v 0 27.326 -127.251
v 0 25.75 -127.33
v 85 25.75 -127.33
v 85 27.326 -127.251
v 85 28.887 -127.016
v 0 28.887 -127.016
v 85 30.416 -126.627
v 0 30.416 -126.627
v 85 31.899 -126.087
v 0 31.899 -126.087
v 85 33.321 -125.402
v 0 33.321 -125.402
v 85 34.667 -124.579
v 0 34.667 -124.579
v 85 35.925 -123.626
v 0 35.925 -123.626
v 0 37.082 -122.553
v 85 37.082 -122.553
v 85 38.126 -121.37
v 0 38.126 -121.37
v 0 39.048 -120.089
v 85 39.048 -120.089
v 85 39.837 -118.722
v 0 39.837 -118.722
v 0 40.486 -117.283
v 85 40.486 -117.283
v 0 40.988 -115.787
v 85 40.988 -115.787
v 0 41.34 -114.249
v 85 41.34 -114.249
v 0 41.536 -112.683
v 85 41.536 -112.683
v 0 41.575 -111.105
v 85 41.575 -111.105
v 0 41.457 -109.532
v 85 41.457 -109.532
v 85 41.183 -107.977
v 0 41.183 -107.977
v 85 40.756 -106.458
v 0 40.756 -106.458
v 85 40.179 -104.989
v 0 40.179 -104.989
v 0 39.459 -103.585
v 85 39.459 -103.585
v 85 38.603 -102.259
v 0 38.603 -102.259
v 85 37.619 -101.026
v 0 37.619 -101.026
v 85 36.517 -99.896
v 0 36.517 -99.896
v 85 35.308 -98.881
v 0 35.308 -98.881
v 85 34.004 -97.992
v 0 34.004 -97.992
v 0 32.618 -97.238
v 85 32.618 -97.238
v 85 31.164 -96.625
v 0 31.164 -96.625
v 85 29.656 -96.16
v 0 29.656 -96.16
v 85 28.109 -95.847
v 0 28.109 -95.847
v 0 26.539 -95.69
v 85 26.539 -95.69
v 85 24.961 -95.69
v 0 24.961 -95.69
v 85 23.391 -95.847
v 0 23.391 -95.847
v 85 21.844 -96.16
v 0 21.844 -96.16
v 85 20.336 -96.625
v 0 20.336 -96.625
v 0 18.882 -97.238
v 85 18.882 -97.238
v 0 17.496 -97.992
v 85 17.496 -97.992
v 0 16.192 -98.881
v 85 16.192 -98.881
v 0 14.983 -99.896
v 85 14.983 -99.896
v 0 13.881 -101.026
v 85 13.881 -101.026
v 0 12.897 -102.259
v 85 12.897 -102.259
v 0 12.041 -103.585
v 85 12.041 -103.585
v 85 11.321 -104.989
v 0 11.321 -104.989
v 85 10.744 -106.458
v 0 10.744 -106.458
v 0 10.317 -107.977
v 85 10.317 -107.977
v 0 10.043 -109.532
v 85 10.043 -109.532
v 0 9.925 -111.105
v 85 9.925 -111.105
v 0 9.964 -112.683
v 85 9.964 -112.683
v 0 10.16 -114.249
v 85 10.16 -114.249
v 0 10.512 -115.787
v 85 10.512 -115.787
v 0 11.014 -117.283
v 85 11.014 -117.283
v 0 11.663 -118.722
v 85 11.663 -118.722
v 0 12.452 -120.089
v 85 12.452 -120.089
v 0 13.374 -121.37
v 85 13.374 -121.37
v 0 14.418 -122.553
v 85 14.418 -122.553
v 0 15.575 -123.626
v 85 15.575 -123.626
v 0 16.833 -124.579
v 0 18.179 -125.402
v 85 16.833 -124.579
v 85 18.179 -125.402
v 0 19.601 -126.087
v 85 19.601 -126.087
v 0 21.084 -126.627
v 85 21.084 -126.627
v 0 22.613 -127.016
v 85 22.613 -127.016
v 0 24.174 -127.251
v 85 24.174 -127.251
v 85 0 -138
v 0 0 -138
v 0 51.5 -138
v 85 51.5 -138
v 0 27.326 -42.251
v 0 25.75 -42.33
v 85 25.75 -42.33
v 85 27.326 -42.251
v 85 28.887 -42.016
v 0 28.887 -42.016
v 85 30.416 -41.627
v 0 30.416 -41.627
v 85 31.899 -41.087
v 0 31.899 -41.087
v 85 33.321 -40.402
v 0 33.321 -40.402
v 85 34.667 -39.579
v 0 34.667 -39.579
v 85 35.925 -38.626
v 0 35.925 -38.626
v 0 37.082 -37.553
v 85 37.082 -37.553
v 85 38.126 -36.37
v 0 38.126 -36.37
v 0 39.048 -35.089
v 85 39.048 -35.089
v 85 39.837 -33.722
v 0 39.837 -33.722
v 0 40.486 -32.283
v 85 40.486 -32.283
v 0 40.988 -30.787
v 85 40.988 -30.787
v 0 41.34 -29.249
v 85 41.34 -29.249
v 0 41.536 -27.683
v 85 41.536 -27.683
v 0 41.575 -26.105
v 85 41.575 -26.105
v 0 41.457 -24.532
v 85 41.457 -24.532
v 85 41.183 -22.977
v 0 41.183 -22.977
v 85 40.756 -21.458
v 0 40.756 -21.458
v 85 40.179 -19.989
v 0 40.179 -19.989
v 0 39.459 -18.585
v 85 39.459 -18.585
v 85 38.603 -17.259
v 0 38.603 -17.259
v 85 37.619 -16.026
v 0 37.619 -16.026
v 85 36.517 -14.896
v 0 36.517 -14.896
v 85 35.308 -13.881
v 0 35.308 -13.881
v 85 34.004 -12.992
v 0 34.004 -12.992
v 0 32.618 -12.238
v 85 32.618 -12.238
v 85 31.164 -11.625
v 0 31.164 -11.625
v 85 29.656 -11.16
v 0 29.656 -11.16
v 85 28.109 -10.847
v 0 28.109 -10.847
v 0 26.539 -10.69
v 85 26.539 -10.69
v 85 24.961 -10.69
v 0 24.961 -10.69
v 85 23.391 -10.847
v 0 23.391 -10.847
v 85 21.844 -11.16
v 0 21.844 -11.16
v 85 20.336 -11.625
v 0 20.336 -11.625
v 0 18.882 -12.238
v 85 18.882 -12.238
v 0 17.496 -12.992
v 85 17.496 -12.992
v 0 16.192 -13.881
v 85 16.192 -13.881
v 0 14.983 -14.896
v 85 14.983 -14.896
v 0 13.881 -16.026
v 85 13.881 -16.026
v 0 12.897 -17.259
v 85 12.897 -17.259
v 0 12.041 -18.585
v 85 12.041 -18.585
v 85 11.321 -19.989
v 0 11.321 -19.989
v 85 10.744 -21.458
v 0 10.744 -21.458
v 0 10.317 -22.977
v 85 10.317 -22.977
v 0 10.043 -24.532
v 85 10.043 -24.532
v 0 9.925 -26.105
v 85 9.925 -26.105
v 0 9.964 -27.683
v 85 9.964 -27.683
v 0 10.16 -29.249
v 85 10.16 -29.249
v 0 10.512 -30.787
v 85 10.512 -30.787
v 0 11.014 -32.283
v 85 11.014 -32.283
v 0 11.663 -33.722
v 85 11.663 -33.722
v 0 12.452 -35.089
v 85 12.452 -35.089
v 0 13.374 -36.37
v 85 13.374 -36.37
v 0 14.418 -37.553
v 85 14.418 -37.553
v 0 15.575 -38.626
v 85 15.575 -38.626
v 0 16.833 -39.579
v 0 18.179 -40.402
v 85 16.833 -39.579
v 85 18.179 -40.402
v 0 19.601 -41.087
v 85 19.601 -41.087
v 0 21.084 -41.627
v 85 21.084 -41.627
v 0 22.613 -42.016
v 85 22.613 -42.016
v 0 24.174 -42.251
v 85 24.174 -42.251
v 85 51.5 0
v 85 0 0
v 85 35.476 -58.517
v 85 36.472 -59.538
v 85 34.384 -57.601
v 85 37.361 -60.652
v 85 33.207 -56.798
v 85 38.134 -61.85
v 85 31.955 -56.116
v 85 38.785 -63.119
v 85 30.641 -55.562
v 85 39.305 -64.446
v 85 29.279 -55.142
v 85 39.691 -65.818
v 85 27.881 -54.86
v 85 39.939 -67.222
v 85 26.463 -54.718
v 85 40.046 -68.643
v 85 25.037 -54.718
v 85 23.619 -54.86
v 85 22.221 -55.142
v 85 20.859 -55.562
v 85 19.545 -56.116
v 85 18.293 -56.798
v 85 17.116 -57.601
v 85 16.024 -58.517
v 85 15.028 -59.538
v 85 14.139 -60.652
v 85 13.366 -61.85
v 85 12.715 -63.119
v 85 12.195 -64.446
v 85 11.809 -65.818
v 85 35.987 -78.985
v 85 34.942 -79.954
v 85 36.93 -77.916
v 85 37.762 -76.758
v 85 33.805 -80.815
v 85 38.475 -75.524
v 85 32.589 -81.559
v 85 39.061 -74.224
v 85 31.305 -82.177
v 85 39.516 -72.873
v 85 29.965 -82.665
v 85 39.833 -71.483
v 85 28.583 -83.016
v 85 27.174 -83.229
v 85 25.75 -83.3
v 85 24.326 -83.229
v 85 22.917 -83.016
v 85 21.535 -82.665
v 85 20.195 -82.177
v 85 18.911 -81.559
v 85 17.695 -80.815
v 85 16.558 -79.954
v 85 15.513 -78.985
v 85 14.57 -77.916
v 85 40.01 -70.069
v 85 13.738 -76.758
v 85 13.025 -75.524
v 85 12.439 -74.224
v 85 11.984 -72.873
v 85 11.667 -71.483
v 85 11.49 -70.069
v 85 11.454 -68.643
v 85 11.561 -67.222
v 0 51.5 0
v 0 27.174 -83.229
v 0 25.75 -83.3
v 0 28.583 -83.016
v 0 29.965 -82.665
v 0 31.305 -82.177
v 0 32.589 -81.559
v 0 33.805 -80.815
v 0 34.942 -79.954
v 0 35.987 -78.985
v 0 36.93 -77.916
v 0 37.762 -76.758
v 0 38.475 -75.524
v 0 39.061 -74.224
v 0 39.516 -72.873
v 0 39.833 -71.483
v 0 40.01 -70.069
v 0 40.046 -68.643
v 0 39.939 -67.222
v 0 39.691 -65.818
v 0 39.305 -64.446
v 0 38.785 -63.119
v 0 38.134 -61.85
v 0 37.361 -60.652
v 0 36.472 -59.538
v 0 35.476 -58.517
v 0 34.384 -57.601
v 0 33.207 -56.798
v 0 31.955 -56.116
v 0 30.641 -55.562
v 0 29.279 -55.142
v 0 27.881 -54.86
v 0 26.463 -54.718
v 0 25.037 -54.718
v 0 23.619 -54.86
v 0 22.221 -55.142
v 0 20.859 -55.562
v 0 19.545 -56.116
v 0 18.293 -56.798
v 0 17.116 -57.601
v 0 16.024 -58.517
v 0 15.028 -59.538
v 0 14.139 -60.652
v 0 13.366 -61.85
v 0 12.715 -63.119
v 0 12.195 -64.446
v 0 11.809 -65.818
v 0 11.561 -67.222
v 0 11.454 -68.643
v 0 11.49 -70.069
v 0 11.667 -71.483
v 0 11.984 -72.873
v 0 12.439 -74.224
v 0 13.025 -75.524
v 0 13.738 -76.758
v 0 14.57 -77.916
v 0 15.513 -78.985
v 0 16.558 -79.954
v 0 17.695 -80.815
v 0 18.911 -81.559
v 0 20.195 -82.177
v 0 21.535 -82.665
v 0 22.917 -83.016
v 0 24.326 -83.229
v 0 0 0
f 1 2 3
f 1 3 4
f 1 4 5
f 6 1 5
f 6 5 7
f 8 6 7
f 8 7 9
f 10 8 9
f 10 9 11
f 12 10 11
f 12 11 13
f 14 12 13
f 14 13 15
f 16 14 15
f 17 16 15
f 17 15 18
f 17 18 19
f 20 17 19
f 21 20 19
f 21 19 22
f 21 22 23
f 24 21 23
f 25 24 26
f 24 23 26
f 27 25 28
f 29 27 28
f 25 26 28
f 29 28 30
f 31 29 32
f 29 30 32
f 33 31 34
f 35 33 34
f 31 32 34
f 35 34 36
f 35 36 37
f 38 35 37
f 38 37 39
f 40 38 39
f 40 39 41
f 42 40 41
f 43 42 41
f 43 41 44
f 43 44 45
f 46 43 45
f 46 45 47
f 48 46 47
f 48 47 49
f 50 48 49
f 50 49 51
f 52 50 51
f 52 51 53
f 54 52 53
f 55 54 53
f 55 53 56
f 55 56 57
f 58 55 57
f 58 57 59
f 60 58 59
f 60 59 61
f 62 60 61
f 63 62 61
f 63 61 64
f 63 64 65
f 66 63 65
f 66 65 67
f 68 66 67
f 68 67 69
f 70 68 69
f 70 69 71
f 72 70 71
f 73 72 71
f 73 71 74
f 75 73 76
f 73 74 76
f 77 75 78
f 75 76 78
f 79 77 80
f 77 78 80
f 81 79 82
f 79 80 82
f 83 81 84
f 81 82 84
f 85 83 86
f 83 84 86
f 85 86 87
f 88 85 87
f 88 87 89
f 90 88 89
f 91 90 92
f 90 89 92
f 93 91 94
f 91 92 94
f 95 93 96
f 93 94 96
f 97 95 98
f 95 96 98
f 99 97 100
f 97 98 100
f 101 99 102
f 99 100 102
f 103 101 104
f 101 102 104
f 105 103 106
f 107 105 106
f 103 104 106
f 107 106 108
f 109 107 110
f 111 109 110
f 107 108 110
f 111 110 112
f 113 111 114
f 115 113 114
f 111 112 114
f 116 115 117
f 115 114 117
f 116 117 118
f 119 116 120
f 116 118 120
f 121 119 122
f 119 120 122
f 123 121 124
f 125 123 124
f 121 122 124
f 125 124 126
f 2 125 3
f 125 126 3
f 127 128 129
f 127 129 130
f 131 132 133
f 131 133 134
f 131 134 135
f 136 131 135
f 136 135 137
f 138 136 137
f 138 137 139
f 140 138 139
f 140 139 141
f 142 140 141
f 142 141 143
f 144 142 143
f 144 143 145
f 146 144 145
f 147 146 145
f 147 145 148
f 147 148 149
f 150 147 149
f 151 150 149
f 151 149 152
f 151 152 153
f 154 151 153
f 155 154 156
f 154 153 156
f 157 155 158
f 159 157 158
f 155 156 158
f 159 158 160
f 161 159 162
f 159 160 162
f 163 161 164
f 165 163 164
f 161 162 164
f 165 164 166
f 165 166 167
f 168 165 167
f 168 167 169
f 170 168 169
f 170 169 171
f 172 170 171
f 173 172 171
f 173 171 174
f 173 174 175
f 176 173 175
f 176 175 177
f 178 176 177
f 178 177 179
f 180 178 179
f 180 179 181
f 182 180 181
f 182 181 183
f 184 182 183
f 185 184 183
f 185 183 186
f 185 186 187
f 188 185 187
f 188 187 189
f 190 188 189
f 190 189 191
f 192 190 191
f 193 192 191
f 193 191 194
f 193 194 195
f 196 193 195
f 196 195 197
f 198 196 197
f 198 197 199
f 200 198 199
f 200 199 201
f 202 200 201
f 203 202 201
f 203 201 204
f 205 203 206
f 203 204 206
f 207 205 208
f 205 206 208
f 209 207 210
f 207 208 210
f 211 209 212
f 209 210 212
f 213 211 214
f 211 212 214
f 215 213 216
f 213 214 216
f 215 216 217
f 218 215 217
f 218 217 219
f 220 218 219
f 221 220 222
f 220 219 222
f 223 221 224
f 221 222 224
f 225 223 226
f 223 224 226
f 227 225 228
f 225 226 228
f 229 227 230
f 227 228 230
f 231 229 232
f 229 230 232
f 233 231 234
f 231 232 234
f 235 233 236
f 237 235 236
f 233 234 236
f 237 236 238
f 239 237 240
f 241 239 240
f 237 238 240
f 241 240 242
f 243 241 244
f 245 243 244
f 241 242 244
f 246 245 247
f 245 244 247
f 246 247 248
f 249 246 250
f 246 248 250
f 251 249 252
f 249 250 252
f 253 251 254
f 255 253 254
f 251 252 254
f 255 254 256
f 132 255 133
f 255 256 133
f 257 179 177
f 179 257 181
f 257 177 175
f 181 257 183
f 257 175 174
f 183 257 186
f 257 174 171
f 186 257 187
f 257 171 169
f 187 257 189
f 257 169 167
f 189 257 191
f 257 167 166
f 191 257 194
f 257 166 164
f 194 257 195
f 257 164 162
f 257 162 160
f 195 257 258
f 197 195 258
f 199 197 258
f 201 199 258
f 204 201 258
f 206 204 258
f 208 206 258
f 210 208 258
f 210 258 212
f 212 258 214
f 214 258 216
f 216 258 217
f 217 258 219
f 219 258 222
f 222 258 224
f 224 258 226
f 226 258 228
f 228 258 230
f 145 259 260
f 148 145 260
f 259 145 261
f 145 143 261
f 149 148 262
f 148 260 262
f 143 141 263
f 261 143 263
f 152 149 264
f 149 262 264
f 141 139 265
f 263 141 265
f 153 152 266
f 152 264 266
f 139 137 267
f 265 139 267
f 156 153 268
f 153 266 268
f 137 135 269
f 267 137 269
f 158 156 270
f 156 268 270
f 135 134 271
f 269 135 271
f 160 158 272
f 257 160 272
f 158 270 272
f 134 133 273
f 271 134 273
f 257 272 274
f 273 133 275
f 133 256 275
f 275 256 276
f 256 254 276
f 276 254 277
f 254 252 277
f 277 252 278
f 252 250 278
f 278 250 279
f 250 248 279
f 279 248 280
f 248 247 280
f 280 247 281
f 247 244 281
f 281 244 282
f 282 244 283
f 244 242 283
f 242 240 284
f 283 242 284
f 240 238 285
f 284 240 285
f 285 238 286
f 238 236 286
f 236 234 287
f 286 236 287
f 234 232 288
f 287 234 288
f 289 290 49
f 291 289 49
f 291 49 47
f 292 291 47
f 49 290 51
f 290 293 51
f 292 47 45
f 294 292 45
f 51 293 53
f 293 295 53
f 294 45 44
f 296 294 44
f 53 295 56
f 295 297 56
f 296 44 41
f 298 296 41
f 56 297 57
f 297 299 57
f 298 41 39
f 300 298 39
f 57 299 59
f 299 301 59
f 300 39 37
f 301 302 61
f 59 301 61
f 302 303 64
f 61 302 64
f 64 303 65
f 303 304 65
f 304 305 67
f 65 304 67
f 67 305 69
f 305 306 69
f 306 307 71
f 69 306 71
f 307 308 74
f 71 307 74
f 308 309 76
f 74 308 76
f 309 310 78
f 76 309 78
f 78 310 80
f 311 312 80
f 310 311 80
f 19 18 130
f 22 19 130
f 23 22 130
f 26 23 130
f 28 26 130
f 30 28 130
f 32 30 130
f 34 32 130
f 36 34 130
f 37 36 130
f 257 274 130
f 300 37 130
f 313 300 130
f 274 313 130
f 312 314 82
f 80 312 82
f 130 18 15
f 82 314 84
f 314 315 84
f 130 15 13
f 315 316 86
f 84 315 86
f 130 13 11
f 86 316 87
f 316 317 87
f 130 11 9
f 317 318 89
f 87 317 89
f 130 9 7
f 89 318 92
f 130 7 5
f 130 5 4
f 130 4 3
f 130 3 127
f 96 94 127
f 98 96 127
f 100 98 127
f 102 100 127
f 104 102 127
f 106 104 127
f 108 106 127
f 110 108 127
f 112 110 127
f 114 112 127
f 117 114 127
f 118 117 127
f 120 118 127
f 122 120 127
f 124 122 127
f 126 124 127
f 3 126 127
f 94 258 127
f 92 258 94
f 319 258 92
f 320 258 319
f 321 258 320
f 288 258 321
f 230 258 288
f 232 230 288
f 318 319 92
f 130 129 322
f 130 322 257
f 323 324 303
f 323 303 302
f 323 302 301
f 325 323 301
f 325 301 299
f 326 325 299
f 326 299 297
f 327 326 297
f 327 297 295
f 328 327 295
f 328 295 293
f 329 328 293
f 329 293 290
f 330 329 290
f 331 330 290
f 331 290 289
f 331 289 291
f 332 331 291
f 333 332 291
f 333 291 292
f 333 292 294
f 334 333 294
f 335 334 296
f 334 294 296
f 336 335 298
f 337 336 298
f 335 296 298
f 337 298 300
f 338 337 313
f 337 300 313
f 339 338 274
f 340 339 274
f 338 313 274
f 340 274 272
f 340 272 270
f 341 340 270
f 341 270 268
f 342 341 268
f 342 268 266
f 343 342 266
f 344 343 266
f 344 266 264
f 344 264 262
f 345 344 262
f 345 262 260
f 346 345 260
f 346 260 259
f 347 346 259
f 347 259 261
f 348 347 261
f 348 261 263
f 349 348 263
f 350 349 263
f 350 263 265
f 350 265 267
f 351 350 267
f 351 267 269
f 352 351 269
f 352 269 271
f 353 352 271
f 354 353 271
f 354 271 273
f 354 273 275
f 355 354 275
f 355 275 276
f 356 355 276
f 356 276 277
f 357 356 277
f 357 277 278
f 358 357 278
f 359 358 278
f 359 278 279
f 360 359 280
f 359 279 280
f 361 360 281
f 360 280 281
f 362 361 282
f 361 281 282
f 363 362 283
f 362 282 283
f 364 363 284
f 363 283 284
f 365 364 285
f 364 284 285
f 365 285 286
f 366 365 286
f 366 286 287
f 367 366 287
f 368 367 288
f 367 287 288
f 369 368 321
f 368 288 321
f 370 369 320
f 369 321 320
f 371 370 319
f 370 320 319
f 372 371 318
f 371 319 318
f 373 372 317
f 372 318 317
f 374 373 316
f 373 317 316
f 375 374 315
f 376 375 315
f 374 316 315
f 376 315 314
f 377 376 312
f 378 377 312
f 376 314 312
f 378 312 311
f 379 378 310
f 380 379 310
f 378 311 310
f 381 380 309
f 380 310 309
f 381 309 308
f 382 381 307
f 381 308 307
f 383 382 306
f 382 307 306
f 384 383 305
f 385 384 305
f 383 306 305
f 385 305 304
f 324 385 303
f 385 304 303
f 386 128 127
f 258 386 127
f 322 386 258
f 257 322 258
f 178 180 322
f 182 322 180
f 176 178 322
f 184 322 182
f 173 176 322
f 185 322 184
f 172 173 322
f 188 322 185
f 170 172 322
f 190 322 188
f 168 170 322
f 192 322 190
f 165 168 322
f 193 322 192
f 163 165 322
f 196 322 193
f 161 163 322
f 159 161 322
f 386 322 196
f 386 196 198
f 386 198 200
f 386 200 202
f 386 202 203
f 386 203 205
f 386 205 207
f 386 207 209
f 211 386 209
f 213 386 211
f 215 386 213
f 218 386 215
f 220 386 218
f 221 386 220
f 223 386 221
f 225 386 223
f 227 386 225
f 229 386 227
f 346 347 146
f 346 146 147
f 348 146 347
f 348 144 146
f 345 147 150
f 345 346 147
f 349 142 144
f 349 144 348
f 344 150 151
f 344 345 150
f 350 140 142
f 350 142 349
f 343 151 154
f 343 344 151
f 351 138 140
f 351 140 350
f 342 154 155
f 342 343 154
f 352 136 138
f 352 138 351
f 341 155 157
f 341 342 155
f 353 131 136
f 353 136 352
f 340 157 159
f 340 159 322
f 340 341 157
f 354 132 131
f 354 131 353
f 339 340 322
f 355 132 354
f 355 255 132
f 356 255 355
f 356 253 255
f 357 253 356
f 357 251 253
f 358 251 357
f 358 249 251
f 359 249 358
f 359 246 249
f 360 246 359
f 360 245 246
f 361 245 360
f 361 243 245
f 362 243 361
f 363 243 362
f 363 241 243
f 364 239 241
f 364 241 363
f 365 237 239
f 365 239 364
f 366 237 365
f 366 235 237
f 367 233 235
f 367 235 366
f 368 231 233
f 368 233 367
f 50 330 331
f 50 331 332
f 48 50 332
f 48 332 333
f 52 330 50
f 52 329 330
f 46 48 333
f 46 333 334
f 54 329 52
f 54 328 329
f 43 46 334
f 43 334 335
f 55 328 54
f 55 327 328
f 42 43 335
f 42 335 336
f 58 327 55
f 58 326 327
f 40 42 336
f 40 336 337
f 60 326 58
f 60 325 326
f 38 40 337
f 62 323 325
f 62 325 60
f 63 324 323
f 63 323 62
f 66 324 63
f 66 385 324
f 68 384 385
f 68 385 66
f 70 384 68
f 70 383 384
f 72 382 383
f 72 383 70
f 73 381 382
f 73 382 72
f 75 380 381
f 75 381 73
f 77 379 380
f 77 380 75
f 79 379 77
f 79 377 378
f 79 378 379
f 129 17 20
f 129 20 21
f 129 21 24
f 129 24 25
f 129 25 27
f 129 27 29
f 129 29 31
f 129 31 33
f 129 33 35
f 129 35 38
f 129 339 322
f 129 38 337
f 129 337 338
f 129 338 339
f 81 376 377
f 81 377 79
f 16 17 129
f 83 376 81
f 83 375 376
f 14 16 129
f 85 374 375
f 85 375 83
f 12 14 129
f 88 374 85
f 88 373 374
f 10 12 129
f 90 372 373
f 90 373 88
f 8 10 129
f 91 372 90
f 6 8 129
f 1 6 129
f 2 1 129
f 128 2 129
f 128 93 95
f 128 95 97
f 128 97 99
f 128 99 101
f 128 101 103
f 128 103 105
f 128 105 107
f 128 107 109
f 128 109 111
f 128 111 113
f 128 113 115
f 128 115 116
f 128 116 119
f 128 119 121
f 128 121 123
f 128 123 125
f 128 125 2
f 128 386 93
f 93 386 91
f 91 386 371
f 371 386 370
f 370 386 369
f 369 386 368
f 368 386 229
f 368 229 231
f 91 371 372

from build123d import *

# Parameters (mm, degrees)
SKETCH1_W           = 85
SKETCH1_H           = 138
BOSS_EXTRUDE1_DEPTH = 51.5
CUT_EXTRUDE2_REACH  = 87
SKETCH3_R           = 14.3
SKETCH3_R_2         = 15.83


with BuildPart() as part:
    # Sketch1 → Boss-Extrude1 (new body)
    with BuildSketch(Plane(origin=(0, 0, 0), x_dir=(1, 0, 0), z_dir=(0, 1, 0))):
        with Locations((42.5, 69)):
            Rectangle(SKETCH1_W, SKETCH1_H)
    extrude(amount=BOSS_EXTRUDE1_DEPTH)

    # Sketch3 → Cut-Extrude2 (cut, up to next)
    with BuildSketch(Plane(origin=(85, 0, 0), x_dir=(0, 0, -1), z_dir=(1, 0, 0)), mode=Mode.PRIVATE) as cut_extrude2_sk1:
        with Locations((69, 25.75)):
            Circle(SKETCH3_R)
    cut_extrude2_tool1 = extrude(cut_extrude2_sk1.sketch, amount=-CUT_EXTRUDE2_REACH, mode=Mode.PRIVATE) & part.part
    add(cut_extrude2_tool1.solids().sort_by_distance((85, 25.75, -69))[0], mode=Mode.SUBTRACT)
    # Sketch3 → Cut-Extrude2 (cut, up to next)
    with BuildSketch(Plane(origin=(85, 0, 0), x_dir=(0, 0, -1), z_dir=(1, 0, 0)), mode=Mode.PRIVATE) as cut_extrude2_sk2:
        with Locations((26.5, 25.75)):
            Circle(SKETCH3_R_2)
    cut_extrude2_tool2 = extrude(cut_extrude2_sk2.sketch, amount=-CUT_EXTRUDE2_REACH, mode=Mode.PRIVATE) & part.part
    add(cut_extrude2_tool2.solids().sort_by_distance((85, 25.75, -26.5))[0], mode=Mode.SUBTRACT)
    # Sketch3 → Cut-Extrude2 (cut, up to next)
    with BuildSketch(Plane(origin=(85, 0, 0), x_dir=(0, 0, -1), z_dir=(1, 0, 0)), mode=Mode.PRIVATE) as cut_extrude2_sk3:
        with Locations((111.5, 25.75)):
            Circle(SKETCH3_R_2)
    cut_extrude2_tool3 = extrude(cut_extrude2_sk3.sketch, amount=-CUT_EXTRUDE2_REACH, mode=Mode.PRIVATE) & part.part
    add(cut_extrude2_tool3.solids().sort_by_distance((85, 25.75, -111.5))[0], mode=Mode.SUBTRACT)


solid = part.part
